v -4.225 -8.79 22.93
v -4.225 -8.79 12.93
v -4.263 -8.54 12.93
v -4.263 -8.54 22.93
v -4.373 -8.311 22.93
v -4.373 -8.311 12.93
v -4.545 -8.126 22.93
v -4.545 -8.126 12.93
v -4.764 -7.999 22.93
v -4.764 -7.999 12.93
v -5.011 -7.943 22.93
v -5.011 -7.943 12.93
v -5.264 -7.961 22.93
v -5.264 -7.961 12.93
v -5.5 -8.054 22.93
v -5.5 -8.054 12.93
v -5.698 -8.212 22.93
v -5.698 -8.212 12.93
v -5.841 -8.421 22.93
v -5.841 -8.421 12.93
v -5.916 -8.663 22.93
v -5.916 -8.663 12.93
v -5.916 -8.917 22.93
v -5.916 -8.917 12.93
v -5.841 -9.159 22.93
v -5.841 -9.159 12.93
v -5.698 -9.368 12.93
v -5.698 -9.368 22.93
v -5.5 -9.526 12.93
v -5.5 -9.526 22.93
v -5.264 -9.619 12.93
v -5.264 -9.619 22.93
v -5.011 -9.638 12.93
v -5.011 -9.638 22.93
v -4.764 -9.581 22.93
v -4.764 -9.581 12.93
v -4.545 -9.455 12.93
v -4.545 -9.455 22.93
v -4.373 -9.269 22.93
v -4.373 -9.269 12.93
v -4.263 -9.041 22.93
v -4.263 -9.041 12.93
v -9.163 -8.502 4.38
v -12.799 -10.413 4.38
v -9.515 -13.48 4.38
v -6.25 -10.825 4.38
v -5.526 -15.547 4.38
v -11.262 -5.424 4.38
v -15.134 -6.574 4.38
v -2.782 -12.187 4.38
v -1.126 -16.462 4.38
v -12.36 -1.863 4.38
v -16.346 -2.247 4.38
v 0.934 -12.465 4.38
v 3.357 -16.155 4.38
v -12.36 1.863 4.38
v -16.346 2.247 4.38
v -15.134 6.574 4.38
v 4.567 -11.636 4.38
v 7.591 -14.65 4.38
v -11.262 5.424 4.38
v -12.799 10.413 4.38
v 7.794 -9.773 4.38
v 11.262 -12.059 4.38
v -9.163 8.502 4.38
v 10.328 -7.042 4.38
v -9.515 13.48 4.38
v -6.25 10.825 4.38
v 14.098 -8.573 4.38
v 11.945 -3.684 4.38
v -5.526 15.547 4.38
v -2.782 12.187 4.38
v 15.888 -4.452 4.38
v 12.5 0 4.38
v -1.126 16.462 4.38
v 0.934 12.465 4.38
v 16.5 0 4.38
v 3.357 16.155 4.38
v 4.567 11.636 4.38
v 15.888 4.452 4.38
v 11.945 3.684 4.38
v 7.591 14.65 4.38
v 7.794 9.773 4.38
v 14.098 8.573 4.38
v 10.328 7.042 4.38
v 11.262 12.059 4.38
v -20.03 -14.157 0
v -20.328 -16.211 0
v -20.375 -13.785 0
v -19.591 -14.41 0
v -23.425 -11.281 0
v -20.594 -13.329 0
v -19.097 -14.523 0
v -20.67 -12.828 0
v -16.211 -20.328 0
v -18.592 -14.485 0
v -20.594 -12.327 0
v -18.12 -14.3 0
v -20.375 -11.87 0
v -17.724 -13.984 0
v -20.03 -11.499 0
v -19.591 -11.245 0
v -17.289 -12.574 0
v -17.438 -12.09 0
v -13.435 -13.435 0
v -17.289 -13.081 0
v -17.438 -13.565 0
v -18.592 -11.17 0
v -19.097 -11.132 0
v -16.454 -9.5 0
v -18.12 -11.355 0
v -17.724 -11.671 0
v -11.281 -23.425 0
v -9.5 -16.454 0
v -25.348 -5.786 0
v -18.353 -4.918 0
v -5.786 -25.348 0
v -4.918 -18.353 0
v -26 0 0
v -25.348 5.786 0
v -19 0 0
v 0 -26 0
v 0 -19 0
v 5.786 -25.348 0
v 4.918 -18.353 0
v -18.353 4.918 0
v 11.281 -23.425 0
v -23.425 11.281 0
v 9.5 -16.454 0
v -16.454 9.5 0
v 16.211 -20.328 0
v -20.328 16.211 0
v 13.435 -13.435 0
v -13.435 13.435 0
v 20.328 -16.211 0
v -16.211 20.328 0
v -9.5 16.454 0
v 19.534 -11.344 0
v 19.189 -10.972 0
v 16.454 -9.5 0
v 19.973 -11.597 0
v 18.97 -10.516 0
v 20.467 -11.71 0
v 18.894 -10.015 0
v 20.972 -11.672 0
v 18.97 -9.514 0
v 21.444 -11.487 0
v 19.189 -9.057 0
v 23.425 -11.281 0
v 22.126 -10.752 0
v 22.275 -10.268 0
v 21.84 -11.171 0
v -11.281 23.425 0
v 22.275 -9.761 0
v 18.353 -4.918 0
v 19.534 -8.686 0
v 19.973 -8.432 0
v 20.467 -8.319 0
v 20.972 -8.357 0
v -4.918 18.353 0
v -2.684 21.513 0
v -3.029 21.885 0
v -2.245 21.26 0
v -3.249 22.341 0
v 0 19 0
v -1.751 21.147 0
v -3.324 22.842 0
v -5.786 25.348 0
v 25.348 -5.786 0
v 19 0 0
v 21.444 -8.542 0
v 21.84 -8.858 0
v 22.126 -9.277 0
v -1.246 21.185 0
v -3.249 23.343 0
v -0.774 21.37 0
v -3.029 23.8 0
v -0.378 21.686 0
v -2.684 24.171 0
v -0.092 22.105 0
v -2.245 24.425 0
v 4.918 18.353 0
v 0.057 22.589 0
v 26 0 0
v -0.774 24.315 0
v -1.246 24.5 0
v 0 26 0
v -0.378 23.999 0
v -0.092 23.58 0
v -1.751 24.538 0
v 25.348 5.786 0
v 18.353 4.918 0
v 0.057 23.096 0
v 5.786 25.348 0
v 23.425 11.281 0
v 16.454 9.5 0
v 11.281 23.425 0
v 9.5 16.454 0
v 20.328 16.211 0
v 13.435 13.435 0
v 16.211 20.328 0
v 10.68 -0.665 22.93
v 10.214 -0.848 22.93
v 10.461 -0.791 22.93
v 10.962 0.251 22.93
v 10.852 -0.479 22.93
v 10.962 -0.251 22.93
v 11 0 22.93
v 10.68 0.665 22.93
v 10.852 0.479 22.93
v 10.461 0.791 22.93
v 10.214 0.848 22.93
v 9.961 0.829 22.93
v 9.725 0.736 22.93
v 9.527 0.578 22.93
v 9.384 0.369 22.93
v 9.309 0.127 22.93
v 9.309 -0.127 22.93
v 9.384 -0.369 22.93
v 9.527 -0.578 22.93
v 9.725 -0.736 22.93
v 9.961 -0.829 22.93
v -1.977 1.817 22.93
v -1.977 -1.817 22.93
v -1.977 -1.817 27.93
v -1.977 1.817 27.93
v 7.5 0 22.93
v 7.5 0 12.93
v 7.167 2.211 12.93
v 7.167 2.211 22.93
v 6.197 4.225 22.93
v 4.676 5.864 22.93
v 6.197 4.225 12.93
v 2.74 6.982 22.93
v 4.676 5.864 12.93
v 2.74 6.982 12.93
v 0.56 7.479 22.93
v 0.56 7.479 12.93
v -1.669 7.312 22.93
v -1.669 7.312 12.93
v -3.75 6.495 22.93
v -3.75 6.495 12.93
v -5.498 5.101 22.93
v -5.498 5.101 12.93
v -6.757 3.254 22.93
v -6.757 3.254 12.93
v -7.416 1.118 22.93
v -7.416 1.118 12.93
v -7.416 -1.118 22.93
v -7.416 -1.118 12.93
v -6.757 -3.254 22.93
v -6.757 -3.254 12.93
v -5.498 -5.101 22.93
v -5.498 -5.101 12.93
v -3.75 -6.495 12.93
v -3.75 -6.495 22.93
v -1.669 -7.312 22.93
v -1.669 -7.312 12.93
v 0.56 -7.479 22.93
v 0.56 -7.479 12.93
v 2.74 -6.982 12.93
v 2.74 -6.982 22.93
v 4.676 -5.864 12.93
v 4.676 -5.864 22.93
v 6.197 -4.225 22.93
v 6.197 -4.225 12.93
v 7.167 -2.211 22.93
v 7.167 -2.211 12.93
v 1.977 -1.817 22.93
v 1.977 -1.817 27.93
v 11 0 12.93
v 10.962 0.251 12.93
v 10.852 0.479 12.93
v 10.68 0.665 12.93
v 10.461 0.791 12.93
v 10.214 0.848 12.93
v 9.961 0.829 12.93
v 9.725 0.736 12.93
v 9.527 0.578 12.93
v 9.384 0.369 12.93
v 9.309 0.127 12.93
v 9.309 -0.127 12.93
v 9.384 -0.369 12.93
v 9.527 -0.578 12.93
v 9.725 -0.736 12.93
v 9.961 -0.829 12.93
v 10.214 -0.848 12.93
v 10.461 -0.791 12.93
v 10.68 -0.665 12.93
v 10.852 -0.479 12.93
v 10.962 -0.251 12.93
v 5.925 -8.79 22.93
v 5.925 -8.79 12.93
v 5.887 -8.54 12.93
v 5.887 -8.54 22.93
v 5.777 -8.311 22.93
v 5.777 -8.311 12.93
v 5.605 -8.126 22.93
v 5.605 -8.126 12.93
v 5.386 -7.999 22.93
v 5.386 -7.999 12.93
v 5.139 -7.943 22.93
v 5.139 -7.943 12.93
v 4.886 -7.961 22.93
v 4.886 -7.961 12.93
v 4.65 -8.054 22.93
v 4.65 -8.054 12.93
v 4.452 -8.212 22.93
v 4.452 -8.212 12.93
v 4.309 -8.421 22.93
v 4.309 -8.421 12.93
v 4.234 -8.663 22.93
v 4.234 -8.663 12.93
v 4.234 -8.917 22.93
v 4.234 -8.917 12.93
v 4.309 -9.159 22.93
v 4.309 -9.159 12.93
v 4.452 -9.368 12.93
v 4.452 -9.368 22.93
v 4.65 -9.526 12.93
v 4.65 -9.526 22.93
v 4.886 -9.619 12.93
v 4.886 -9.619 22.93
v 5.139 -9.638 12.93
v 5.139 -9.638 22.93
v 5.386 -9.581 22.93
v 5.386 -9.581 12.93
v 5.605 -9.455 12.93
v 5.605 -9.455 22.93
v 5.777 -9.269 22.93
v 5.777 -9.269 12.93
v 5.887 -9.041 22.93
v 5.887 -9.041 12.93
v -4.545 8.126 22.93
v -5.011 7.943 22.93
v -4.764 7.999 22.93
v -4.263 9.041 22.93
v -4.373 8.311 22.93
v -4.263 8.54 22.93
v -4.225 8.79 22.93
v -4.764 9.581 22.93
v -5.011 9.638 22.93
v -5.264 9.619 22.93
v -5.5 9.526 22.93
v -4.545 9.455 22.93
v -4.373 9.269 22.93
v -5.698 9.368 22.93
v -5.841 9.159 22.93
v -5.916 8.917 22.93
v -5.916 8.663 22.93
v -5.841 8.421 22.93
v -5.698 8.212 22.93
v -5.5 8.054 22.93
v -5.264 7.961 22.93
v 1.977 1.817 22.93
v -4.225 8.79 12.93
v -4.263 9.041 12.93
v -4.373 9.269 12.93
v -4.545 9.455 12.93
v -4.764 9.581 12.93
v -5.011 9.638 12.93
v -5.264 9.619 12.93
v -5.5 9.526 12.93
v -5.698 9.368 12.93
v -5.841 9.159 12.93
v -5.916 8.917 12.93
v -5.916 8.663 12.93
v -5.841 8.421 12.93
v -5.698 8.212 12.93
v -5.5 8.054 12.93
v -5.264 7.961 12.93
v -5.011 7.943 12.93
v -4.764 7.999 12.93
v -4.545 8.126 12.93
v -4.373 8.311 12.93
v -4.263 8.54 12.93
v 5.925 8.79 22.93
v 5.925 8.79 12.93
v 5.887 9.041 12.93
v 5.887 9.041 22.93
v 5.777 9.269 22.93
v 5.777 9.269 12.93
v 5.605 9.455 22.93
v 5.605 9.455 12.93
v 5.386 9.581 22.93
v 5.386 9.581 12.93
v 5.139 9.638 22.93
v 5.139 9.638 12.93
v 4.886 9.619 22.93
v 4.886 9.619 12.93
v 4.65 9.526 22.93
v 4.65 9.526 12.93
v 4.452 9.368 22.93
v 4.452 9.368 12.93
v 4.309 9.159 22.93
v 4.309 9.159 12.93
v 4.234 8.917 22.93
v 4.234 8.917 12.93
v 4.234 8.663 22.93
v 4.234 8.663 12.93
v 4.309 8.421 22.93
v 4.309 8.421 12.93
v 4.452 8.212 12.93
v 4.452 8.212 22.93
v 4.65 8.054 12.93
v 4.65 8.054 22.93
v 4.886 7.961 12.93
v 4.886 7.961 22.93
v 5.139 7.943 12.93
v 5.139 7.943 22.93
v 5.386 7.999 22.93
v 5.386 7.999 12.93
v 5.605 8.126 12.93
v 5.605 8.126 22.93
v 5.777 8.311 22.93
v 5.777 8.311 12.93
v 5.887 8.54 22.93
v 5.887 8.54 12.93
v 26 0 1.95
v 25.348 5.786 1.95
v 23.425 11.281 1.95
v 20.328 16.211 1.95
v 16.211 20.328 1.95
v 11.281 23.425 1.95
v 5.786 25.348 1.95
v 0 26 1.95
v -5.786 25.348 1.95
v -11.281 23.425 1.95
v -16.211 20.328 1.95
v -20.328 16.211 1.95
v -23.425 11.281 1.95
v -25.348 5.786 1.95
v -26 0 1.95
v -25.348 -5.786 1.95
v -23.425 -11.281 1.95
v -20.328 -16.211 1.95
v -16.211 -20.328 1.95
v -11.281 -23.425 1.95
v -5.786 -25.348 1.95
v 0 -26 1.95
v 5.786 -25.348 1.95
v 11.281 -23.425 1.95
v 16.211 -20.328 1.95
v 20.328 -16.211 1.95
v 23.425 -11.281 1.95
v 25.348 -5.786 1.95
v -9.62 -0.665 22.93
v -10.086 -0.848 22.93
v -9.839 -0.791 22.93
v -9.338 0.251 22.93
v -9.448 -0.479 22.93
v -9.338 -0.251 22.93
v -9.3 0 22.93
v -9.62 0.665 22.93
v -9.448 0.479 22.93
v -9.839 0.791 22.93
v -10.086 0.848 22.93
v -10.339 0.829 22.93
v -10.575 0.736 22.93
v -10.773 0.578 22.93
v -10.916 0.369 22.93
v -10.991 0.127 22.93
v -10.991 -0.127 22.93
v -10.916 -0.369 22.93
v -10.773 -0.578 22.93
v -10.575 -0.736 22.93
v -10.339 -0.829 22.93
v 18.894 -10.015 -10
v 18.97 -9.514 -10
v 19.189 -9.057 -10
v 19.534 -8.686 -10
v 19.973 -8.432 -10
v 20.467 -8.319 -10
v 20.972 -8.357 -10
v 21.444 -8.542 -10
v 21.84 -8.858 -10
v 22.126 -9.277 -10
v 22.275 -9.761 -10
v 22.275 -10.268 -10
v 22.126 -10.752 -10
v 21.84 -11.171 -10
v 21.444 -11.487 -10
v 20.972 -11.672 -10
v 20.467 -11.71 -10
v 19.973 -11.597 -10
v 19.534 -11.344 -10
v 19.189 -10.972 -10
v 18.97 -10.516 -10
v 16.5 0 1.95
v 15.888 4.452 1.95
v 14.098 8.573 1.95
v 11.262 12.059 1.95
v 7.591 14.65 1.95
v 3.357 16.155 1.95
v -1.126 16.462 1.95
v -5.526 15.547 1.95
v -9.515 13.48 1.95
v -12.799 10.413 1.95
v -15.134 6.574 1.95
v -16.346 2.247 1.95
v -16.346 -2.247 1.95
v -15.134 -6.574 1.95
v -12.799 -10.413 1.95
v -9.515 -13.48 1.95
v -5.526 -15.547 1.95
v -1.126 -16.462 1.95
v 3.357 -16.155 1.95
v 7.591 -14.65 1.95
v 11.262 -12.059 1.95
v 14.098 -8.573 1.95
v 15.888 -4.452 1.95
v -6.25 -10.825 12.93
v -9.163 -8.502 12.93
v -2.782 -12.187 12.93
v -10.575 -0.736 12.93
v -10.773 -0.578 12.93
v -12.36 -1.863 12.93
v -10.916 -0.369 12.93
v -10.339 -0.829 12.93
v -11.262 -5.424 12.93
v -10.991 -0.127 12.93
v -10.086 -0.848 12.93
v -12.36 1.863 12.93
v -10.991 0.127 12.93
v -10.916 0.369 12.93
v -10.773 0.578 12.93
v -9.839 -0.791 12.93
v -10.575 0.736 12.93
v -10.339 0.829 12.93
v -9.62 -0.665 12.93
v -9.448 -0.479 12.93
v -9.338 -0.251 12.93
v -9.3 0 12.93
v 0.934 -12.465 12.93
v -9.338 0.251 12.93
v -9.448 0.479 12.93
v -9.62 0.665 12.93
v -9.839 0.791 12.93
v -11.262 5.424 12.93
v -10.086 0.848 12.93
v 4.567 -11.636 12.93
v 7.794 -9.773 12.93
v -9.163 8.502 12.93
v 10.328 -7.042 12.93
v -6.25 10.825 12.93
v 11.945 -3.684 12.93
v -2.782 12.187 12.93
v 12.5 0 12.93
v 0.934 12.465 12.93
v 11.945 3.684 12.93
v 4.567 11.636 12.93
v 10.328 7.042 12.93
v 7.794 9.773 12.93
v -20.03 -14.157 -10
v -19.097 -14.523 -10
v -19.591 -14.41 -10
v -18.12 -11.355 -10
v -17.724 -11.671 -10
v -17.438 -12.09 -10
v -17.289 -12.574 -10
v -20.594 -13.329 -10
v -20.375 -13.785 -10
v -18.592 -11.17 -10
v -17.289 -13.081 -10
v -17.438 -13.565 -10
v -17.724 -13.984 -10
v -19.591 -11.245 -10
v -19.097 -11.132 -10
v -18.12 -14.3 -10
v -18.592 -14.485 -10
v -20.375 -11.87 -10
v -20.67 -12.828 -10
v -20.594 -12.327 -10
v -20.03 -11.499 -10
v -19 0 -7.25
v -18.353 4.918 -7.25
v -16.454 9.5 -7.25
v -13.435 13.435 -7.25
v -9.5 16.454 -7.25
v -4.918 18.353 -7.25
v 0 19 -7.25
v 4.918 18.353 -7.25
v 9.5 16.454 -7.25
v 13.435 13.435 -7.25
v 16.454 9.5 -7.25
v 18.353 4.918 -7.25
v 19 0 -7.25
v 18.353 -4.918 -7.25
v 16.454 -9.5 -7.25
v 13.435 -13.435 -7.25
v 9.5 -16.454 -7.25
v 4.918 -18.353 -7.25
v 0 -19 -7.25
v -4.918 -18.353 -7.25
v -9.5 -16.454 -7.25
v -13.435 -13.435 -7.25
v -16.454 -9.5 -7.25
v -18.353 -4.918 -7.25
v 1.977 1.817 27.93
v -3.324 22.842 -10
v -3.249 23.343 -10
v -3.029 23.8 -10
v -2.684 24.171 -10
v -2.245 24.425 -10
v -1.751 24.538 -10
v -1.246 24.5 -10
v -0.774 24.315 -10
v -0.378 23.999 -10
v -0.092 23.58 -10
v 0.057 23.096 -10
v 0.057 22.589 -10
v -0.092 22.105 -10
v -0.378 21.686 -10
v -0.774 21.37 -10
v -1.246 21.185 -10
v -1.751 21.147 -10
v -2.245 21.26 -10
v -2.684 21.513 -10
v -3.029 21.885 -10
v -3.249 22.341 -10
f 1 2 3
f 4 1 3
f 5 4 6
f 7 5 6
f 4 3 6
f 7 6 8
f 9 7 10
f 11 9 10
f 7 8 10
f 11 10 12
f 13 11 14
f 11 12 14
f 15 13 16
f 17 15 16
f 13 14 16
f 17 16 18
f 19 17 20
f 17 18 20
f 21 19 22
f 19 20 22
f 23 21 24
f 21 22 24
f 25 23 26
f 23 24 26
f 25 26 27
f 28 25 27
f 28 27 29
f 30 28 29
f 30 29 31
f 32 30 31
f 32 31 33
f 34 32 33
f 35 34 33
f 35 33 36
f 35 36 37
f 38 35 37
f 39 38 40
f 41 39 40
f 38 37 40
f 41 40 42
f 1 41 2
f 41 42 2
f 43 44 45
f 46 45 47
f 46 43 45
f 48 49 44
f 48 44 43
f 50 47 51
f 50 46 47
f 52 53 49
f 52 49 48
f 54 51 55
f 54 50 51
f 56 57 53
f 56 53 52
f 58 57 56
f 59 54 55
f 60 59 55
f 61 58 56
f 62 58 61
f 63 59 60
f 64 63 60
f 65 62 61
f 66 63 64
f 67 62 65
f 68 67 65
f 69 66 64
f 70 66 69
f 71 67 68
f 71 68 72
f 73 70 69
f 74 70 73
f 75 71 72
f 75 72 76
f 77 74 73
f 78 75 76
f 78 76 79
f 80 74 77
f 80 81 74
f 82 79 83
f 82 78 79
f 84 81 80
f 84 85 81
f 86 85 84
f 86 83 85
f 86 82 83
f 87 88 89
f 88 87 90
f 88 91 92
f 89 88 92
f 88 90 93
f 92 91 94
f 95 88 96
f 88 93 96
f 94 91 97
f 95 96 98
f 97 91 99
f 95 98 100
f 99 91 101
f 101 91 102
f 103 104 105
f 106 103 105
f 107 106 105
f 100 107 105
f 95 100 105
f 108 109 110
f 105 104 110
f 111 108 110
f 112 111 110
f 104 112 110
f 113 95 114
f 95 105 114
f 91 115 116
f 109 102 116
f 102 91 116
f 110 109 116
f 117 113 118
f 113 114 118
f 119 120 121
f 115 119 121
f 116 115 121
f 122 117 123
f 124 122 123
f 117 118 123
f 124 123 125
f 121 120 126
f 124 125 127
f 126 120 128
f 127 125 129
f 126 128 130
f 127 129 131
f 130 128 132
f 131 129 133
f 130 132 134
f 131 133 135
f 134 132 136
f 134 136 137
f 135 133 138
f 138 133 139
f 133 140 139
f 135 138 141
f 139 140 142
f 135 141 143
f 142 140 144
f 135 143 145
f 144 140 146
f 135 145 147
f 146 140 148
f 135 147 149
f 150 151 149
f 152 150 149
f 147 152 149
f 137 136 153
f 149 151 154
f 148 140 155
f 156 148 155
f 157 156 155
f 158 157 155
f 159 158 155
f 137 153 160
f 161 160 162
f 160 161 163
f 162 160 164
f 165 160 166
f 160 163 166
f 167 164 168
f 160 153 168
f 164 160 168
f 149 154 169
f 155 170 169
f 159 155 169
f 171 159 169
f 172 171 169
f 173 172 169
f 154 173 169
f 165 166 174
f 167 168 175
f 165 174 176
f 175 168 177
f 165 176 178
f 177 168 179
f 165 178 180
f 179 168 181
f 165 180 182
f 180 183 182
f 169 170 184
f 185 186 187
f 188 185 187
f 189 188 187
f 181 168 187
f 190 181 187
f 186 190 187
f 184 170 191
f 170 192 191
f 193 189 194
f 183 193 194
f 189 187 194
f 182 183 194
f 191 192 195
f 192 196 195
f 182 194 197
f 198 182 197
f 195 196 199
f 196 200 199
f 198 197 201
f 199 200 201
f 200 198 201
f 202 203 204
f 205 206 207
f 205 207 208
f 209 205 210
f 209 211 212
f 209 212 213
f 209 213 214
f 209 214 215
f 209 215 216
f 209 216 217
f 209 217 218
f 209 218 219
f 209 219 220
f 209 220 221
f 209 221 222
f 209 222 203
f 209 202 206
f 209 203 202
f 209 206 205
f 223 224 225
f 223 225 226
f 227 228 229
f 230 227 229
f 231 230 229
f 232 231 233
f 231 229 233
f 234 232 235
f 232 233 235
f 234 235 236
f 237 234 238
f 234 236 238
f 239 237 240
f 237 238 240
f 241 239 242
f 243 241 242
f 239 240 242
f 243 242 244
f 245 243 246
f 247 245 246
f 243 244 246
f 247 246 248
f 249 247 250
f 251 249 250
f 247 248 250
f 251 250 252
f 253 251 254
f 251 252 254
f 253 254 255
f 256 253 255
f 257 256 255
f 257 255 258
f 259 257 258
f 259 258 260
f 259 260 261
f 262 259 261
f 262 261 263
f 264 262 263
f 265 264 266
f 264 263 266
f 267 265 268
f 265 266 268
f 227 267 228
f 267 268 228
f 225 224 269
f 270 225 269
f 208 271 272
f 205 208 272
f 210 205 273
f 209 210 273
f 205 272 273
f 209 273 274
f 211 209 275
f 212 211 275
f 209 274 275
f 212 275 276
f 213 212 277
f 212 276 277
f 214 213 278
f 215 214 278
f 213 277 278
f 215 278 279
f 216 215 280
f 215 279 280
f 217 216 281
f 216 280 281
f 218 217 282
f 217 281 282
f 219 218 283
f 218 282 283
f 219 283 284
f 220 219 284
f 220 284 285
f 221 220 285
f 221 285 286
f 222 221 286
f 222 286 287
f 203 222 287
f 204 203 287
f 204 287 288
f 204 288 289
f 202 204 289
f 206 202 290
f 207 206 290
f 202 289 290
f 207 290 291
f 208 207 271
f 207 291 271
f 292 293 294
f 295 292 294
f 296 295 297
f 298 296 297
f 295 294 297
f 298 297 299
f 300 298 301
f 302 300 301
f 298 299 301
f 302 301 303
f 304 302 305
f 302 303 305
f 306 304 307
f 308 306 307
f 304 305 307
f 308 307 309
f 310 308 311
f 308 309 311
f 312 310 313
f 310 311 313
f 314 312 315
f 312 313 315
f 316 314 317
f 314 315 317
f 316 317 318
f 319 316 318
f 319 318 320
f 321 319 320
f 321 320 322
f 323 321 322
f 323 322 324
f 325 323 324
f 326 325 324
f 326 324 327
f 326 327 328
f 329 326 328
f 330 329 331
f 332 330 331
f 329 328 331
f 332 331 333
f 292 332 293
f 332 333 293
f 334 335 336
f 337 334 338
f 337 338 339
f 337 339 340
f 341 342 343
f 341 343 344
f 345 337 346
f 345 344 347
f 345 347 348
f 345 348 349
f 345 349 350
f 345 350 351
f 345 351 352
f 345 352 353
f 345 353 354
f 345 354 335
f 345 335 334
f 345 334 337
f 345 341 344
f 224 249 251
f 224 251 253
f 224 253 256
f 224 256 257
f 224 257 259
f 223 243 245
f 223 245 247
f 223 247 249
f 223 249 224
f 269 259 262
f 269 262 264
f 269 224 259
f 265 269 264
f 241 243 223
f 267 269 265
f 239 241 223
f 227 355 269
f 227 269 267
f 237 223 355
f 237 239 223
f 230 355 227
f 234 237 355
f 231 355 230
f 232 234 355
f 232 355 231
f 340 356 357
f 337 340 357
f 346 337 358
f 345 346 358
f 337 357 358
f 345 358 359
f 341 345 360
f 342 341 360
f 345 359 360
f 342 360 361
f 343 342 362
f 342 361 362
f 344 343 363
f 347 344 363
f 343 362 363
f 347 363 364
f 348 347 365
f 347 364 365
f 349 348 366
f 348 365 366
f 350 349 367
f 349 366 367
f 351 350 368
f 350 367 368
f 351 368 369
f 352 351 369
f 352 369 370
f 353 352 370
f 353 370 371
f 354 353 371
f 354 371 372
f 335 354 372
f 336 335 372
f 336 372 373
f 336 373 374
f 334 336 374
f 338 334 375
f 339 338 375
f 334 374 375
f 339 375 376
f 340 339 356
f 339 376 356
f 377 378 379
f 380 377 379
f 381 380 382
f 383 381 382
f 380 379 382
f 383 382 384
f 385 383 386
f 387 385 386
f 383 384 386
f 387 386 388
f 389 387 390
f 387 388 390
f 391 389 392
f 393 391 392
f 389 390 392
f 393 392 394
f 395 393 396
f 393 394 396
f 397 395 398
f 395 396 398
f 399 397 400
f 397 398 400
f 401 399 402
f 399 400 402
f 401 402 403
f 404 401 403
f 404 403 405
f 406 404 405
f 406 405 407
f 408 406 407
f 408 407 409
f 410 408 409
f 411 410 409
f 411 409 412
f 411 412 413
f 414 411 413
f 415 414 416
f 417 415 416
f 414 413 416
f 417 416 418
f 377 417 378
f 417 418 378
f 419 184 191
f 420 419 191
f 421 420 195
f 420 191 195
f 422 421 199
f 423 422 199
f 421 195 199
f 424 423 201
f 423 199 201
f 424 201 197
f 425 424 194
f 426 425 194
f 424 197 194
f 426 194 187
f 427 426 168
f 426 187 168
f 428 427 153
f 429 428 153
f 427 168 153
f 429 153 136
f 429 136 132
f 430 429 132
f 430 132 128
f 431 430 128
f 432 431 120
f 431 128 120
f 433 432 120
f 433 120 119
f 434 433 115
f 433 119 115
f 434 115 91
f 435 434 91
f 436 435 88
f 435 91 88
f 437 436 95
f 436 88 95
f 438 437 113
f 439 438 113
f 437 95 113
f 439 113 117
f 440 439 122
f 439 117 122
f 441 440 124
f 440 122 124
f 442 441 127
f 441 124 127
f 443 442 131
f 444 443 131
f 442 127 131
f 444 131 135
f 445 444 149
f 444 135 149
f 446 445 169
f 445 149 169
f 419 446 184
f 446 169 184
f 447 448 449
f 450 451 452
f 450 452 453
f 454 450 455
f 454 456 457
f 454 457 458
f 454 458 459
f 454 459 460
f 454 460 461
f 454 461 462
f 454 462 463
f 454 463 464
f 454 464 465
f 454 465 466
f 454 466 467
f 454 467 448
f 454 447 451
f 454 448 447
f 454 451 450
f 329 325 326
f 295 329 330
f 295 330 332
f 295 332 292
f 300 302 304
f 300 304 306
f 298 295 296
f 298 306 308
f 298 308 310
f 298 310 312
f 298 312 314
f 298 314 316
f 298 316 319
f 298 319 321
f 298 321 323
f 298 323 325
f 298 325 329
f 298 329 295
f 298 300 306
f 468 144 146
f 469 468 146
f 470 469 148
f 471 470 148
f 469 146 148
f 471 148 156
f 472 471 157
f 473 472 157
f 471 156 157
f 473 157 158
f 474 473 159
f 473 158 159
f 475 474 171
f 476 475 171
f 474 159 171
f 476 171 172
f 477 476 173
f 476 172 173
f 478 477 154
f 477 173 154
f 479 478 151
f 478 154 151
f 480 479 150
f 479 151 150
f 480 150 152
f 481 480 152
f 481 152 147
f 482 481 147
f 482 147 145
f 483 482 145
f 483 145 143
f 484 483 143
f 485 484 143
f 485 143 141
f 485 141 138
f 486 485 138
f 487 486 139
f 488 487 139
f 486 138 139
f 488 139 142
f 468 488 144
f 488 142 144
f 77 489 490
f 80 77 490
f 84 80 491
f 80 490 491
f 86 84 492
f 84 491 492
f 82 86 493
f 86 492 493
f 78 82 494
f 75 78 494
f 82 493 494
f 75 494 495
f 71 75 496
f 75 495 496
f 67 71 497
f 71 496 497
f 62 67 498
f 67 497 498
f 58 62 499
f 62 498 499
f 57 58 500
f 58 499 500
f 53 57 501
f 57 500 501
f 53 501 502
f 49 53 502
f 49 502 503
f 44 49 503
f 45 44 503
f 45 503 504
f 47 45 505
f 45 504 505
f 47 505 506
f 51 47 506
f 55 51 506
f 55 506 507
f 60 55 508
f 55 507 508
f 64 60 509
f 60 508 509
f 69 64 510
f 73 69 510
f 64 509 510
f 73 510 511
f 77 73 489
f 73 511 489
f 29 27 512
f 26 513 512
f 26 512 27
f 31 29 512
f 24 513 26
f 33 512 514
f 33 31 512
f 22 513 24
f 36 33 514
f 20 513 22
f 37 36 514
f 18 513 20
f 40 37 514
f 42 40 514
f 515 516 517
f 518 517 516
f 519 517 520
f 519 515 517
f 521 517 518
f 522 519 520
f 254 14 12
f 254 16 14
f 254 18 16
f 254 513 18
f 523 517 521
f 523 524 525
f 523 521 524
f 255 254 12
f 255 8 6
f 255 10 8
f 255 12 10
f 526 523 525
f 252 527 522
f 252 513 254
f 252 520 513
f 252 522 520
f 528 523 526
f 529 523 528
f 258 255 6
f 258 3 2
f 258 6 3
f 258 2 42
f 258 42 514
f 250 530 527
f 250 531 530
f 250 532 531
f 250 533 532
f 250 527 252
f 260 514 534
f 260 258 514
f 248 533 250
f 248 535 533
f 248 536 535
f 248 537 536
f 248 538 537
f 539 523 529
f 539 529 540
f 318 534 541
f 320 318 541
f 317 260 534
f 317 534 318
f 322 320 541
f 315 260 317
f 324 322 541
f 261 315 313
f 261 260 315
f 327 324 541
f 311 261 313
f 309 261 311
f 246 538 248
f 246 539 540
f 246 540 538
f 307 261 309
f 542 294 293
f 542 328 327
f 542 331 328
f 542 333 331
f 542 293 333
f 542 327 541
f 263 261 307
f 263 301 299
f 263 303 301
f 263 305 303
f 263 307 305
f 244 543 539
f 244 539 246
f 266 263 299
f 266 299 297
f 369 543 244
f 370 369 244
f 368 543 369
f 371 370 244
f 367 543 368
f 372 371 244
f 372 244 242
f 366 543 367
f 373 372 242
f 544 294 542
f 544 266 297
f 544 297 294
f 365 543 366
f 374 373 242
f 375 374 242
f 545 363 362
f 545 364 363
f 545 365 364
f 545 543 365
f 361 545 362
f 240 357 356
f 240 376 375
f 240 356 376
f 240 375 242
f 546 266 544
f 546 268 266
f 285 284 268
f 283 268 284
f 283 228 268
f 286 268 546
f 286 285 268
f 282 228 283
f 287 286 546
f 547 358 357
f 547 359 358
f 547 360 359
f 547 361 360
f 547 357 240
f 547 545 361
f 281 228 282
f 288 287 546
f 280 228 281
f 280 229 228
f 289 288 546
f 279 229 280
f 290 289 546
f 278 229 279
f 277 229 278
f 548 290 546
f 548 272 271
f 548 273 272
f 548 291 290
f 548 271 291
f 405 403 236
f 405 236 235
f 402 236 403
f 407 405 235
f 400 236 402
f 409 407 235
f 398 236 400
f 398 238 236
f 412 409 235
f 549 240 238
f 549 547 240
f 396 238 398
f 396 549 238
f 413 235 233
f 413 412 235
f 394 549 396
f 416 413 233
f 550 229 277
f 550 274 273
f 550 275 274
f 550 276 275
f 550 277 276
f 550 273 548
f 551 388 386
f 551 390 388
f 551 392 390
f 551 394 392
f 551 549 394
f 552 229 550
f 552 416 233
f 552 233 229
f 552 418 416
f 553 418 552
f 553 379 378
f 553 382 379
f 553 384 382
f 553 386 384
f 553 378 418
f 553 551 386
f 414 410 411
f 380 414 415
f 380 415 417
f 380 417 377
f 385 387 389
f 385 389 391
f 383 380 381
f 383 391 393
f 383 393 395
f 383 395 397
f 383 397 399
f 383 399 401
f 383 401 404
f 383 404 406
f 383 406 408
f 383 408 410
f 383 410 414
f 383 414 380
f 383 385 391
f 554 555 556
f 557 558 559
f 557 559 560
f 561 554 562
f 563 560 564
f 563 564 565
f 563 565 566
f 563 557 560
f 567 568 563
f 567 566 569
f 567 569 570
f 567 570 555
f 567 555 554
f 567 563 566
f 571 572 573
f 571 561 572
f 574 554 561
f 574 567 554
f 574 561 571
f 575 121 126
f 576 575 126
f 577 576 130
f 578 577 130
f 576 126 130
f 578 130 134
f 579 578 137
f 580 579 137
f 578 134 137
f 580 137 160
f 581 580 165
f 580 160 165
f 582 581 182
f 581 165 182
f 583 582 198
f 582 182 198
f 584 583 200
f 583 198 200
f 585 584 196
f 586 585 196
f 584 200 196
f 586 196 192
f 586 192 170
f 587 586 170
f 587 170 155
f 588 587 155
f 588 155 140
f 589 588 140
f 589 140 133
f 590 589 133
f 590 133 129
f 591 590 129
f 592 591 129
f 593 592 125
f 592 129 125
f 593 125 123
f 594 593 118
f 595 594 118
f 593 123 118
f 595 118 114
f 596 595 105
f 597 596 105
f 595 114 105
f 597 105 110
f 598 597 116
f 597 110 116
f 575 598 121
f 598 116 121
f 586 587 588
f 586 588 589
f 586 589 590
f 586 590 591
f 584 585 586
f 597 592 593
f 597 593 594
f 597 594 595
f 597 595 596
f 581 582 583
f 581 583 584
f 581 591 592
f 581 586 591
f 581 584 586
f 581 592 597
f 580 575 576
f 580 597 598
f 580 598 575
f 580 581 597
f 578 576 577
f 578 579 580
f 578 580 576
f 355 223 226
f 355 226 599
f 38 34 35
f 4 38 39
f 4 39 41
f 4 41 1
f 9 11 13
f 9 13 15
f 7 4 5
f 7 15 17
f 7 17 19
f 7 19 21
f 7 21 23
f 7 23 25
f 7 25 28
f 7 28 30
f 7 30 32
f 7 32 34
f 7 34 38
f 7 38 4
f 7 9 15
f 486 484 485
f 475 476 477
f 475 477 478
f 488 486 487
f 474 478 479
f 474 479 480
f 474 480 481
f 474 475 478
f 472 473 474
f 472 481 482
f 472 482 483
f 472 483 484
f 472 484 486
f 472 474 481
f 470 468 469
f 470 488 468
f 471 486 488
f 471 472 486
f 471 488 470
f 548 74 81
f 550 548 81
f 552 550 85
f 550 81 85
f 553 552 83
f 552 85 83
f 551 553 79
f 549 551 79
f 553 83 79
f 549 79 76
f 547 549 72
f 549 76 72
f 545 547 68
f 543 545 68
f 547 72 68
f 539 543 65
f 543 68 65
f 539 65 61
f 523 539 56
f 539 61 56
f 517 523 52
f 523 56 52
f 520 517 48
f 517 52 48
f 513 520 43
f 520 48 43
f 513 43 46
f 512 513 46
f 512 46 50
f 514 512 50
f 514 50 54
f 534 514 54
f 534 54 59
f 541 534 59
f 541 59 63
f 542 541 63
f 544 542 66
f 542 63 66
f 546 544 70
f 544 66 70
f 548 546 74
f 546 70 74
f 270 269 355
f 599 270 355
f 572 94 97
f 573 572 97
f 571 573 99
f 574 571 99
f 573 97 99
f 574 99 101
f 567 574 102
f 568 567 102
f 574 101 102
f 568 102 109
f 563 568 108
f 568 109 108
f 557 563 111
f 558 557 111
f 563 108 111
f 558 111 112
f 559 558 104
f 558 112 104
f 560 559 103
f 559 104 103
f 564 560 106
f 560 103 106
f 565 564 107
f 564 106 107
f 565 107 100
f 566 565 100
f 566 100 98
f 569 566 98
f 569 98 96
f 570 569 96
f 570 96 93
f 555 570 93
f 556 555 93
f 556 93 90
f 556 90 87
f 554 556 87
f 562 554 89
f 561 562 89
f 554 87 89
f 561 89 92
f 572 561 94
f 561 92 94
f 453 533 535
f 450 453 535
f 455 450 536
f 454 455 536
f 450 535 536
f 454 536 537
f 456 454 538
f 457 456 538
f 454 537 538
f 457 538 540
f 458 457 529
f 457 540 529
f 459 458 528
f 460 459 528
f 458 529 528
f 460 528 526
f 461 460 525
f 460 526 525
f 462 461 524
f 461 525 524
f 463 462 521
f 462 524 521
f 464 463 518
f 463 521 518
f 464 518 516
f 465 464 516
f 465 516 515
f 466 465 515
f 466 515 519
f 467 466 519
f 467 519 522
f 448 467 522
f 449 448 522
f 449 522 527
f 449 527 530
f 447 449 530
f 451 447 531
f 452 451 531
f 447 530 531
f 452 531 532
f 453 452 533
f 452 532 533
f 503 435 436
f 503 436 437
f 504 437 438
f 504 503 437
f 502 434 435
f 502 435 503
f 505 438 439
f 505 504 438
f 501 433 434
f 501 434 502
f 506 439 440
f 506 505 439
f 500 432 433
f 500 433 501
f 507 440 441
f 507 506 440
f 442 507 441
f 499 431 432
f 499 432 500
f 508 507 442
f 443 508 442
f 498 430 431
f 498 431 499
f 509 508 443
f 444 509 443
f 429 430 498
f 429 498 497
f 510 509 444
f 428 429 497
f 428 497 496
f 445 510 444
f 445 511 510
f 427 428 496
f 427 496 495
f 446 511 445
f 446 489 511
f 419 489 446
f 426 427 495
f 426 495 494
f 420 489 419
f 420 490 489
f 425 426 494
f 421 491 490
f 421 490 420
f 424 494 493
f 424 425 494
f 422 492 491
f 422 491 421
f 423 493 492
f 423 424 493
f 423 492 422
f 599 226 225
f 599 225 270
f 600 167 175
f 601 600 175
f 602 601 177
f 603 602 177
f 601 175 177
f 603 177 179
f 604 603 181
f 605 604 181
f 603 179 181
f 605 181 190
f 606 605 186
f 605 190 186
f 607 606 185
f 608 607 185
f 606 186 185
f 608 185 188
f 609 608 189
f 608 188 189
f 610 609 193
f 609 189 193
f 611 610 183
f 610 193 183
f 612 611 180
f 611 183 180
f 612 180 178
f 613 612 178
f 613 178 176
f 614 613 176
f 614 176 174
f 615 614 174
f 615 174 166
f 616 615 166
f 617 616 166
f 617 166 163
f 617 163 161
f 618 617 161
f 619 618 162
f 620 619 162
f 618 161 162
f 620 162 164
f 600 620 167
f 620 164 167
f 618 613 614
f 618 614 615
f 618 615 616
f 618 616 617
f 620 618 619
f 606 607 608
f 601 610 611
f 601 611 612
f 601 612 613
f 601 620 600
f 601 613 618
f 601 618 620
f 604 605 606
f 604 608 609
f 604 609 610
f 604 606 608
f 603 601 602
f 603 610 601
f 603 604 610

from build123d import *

# Parameters (mm, degrees)
SKETCH1_R           = 26
BOSS_EXTRUDE1_DEPTH = 1.95
SKETCH2_R           = 19
BOSS_EXTRUDE2_DEPTH = 7.25
SKETCH3_R           = 16.5
BOSS_EXTRUDE3_DEPTH = 2.43
SKETCH4_R           = 12.5
BOSS_EXTRUDE4_DEPTH = 8.55
SKETCH5_R           = 7.5
BOSS_EXTRUDE5_DEPTH = 10
SKETCH6_R           = 1.7
BOSS_EXTRUDE6_DEPTH = 10
SKETCH7_R           = 0.85
BOSS_EXTRUDE7_DEPTH = 10
SKETCH8_W           = 3.953217044
SKETCH8_H           = 3.634424256
BOSS_EXTRUDE8_DEPTH = 5


with BuildPart() as part:
    # Sketch1 → Boss-Extrude1 (new body)
    with BuildSketch(Plane.XY):
        Circle(SKETCH1_R)
    extrude(amount=BOSS_EXTRUDE1_DEPTH)

    # Sketch2 → Boss-Extrude2 (add)
    with BuildSketch(Plane(origin=(0, 0, 0), x_dir=(-1, 0, 0), z_dir=(0, 0, -1))):
        Circle(SKETCH2_R)
    extrude(amount=BOSS_EXTRUDE2_DEPTH)

    # Sketch3 → Boss-Extrude3 (add)
    with BuildSketch(Plane.XY.offset(1.95)):
        Circle(SKETCH3_R)
    extrude(amount=BOSS_EXTRUDE3_DEPTH)

    # Sketch4 → Boss-Extrude4 (add)
    with BuildSketch(Plane.XY.offset(4.38)):
        Circle(SKETCH4_R)
    extrude(amount=BOSS_EXTRUDE4_DEPTH)

    # Sketch5 → Boss-Extrude5 (add)
    with BuildSketch(Plane.XY.offset(12.93)):
        Circle(SKETCH5_R)
    extrude(amount=BOSS_EXTRUDE5_DEPTH)

    # Sketch6 → Boss-Extrude6 (add)
    with BuildSketch(Plane(origin=(0, 0, 0), x_dir=(-1, 0, 0), z_dir=(0, 0, -1))):
        with Locations((18.970004687, -12.827662382)):
            Circle(SKETCH6_R)
        with Locations((-20.594083837, -10.014674777)):
            Circle(SKETCH6_R)
        with Locations((1.624079151, 22.84233716)):
            Circle(SKETCH6_R)
    extrude(amount=BOSS_EXTRUDE6_DEPTH)

    # Sketch7 → Boss-Extrude7 (add)
    with BuildSketch(Plane.XY.offset(12.93)):
        with Locations((-10.15, 0)):
            Circle(SKETCH7_R)
        with Locations((-5.075, 8.790157848)):
            Circle(SKETCH7_R)
        with Locations((5.075, 8.790157848)):
            Circle(SKETCH7_R)
        with Locations((10.15, 0)):
            Circle(SKETCH7_R)
        with Locations((5.075, -8.790157848)):
            Circle(SKETCH7_R)
        with Locations((-5.075, -8.790157848)):
            Circle(SKETCH7_R)
    extrude(amount=BOSS_EXTRUDE7_DEPTH)

    # Sketch8 → Boss-Extrude8 (add)
    with BuildSketch(Plane.XY.offset(22.93)):
        Rectangle(SKETCH8_W, SKETCH8_H)
    extrude(amount=BOSS_EXTRUDE8_DEPTH)


solid = part.part
